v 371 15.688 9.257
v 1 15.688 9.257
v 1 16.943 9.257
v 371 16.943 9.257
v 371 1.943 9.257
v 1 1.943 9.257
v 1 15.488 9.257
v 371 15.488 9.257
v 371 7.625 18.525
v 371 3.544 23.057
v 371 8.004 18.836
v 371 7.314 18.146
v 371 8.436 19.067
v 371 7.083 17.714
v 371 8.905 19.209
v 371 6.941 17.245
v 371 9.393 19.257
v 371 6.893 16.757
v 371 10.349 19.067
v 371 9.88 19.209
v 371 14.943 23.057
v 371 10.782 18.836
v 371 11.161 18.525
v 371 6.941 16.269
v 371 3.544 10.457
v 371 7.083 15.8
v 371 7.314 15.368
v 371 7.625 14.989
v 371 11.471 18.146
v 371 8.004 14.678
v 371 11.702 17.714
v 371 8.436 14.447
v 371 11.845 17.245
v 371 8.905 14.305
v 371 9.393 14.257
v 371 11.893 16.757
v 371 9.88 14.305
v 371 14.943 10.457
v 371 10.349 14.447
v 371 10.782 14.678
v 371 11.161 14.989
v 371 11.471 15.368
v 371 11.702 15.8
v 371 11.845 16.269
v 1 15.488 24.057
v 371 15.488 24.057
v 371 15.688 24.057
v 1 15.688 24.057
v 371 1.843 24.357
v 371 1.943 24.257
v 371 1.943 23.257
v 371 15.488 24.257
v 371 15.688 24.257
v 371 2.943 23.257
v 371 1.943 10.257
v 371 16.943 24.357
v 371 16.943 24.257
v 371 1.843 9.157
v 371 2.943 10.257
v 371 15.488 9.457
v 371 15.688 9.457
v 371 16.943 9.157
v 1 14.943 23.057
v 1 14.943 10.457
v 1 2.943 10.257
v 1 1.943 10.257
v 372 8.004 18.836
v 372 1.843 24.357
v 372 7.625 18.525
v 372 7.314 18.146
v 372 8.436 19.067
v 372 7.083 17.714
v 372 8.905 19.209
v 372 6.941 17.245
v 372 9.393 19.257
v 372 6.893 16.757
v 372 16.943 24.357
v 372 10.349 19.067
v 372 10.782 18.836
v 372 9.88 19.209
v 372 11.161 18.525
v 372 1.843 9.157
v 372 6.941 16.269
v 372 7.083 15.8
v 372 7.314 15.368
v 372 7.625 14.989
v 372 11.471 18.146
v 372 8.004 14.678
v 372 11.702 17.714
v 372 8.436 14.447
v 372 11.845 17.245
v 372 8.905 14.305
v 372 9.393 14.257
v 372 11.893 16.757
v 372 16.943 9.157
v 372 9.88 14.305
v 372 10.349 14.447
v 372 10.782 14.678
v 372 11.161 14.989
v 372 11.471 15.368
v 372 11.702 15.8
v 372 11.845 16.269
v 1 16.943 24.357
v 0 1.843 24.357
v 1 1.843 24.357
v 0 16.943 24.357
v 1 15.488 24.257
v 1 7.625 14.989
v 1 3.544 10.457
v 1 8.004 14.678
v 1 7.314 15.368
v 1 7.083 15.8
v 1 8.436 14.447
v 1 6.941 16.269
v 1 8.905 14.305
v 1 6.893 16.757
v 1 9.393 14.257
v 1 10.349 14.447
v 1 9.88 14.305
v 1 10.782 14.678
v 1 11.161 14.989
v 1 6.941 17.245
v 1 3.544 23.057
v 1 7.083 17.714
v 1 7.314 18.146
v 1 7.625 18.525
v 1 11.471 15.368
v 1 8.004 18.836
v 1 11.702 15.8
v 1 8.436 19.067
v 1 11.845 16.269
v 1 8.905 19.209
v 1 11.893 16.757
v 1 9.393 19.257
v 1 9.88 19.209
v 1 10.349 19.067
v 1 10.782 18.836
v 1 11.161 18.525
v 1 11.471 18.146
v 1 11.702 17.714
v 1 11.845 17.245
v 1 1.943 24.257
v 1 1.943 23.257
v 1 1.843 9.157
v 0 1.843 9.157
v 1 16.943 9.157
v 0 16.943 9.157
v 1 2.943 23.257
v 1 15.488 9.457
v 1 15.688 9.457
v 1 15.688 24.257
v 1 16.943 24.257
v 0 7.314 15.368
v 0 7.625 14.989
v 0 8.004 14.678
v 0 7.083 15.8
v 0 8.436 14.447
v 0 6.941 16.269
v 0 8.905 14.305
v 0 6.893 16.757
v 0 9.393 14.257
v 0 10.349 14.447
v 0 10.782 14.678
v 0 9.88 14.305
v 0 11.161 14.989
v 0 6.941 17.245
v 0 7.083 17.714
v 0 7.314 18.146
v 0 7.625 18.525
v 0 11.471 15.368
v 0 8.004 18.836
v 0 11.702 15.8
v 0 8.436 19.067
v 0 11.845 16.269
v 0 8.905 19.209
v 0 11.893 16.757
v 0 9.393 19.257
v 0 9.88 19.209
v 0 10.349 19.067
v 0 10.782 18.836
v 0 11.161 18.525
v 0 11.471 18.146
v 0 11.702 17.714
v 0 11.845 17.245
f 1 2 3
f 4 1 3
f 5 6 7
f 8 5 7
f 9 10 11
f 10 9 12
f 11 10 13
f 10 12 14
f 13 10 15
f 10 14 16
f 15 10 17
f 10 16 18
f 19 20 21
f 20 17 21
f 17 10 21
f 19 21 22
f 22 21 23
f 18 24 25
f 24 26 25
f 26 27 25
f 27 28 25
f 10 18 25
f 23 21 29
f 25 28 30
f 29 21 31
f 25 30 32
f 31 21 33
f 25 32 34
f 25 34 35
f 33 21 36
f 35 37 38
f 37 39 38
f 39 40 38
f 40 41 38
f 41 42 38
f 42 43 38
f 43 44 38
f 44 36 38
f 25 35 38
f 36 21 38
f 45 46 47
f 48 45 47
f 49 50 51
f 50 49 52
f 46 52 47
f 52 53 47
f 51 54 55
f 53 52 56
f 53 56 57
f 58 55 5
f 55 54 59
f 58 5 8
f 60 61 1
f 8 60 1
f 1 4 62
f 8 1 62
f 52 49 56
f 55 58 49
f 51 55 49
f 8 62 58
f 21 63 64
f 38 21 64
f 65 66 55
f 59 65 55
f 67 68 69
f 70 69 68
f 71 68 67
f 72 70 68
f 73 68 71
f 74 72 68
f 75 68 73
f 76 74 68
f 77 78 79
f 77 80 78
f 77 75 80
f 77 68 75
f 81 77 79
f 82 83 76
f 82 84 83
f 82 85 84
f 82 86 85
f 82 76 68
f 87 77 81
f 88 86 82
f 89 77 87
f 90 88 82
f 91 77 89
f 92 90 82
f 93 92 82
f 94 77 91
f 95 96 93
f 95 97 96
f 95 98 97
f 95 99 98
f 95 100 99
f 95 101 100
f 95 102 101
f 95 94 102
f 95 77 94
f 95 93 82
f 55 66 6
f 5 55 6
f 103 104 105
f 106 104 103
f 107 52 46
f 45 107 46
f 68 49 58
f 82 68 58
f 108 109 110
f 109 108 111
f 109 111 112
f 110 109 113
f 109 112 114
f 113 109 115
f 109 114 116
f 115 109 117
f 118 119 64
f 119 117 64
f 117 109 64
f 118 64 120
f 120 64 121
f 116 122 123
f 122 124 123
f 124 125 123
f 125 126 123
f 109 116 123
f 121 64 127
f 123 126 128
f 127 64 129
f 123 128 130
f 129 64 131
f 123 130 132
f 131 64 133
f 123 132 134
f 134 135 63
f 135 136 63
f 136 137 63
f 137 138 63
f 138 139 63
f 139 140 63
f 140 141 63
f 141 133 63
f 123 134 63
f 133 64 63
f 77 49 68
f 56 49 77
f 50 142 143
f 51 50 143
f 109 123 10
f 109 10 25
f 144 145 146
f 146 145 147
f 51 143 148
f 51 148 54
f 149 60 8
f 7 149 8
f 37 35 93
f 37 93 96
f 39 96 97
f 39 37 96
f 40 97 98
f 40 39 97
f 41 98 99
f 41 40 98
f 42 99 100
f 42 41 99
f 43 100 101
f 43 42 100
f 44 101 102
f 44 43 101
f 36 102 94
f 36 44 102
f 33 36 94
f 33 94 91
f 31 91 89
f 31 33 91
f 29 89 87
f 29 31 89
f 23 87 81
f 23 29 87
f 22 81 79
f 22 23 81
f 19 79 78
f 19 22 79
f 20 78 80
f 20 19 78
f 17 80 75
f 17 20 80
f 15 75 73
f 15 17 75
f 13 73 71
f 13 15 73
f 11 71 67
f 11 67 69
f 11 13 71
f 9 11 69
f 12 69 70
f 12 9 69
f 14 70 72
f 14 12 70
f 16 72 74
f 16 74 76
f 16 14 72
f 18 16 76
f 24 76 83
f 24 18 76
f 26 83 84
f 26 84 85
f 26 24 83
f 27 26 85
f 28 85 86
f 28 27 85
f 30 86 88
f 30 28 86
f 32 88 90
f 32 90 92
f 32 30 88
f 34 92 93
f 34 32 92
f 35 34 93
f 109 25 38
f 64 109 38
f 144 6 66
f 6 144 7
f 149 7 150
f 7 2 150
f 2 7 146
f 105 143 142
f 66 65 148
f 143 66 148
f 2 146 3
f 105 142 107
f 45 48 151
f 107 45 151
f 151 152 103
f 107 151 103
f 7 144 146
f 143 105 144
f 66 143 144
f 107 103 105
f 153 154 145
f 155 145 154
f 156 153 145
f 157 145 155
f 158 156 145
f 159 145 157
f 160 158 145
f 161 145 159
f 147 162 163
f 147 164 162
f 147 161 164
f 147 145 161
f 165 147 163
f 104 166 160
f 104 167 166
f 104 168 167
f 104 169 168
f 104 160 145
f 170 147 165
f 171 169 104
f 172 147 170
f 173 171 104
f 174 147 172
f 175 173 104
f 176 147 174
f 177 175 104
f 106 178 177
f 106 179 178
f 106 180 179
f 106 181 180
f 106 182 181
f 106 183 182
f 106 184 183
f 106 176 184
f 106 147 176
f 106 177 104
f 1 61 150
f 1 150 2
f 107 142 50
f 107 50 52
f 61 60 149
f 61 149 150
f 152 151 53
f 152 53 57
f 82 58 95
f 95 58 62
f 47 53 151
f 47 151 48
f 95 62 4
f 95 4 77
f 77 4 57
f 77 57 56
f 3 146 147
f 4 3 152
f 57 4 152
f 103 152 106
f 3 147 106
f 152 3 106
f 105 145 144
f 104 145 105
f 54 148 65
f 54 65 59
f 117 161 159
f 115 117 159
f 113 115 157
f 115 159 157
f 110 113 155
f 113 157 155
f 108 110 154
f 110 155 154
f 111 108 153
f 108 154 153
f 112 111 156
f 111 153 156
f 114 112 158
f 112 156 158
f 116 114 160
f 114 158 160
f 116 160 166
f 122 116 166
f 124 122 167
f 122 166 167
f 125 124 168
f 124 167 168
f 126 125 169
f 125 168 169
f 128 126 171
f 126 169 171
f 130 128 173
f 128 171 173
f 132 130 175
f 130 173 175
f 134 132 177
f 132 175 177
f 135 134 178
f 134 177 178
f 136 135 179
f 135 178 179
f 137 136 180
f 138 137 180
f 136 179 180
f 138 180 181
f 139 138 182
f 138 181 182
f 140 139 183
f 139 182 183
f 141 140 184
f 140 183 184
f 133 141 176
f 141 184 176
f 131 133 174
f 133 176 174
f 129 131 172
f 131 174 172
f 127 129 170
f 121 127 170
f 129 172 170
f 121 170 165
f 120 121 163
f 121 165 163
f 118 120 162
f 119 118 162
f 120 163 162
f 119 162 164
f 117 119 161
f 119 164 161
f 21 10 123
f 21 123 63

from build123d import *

# Parameters (mm, degrees)
SKETCH_1_W          = 15
SKETCH_1_H          = 15
EXTRUDE_1_DEPTH     = 372
SKETCH_2_R          = 2.6
SKETCH_2_W          = 0.2
SKETCH_2_H          = 0.2
CUT_EXTRUDE_2_DEPTH = 372
SKETCH_3_W          = 370
SKETCH_3_H          = 13
CUT_EXTRUDE_3_DEPTH = 1
SKETCH_4_W          = 15
SKETCH_4_H          = 15
CUT_EXTRUDE_4_DEPTH = 1
SKETCH_5_W          = 15
SKETCH_5_H          = 15
CUT_EXTRUDE_5_DEPTH = 1
SKETCH_6_W          = 12.6
SKETCH_6_H          = 11.399012469
CUT_EXTRUDE_6_DEPTH = 370
SKETCH_7_W          = 15.2
SKETCH_7_H          = 15.1
SKETCH_7_R          = 2.5
EXTRUDE_4_DEPTH     = 1
EXTRUDE_START       = 1
SKETCH_8_W          = 15.2
SKETCH_8_H          = 15.1
SKETCH_8_R          = 2.5
EXTRUDE_5_DEPTH     = 1


with BuildPart() as part:
    # 草图1 → 凸台-拉伸1 (new body)
    with BuildSketch(Plane(origin=(0, 0, 0), x_dir=(0, 0, -1), z_dir=(1, 0, 0))):
        with Locations((-16.757142857, 9.442767842)):
            Rectangle(SKETCH_1_W, SKETCH_1_H)
    extrude(amount=EXTRUDE_1_DEPTH)

    # 草图2 → 切除-拉伸2 (cut)
    with BuildSketch(Plane(origin=(372, 0, 0), x_dir=(0, 0, -1), z_dir=(1, 0, 0))):
        with Locations((-16.757142857, 9.442767842)):
            Circle(SKETCH_2_R)
        with Locations((-24.157142857, 15.588150761)):
            Rectangle(SKETCH_2_W, SKETCH_2_H)
        with Locations((-9.357142857, 15.588150761)):
            Rectangle(SKETCH_2_W, SKETCH_2_H)
    extrude(amount=-CUT_EXTRUDE_2_DEPTH, mode=Mode.SUBTRACT)

    # 草图3 → 切除-拉伸3 (cut)
    with BuildSketch(Plane.XZ.offset(-1.942767842)):
        with Locations((186, 16.757142857)):
            Rectangle(SKETCH_3_W, SKETCH_3_H)
    extrude(amount=-CUT_EXTRUDE_3_DEPTH, mode=Mode.SUBTRACT)

    # 草图4 → 切除-拉伸4 (cut)
    with BuildSketch(Plane.ZY):
        with Locations((16.757142857, 9.442767842)):
            Rectangle(SKETCH_4_W, SKETCH_4_H)
    extrude(amount=-CUT_EXTRUDE_4_DEPTH, mode=Mode.SUBTRACT)

    # 草图5 → 切除-拉伸5 (cut)
    with BuildSketch(Plane(origin=(372, 0, 0), x_dir=(0, 0, -1), z_dir=(1, 0, 0))):
        with Locations((-16.757142857, 9.442767842)):
            Rectangle(SKETCH_5_W, SKETCH_5_H)
    extrude(amount=-CUT_EXTRUDE_5_DEPTH, mode=Mode.SUBTRACT)

    # 草图6 → 切除-拉伸6 (cut)
    with BuildSketch(Plane(origin=(371, 0, 0), x_dir=(0, 0, -1), z_dir=(1, 0, 0))):
        with Locations((-16.757142857, 9.243261608)):
            Rectangle(SKETCH_6_W, SKETCH_6_H)
    extrude(amount=-CUT_EXTRUDE_6_DEPTH, mode=Mode.SUBTRACT)

    # 草图7 → 凸台-拉伸4 (add)
    with BuildSketch(Plane(origin=(371, 0, 0), x_dir=(0, 0, -1), z_dir=(1, 0, 0))):
        with Locations((-16.757142857, 9.392767842)):
            Rectangle(SKETCH_7_W, SKETCH_7_H)
        with Locations((-16.757142857, 9.392767842)):
            Circle(SKETCH_7_R, mode=Mode.SUBTRACT)
    extrude(amount=EXTRUDE_4_DEPTH)

    # 草图8 → 凸台-拉伸5 (add)
    with BuildSketch(Plane.ZY.offset(-1).offset(EXTRUDE_START)):
        with Locations((16.757142857, 9.392767842)):
            Rectangle(SKETCH_8_W, SKETCH_8_H)
        with Locations(Location((16.757142857, 9.392767842, 0), (0, 0, 180))):
            Circle(SKETCH_8_R, mode=Mode.SUBTRACT)
    extrude(amount=-EXTRUDE_5_DEPTH)


solid = part.part
